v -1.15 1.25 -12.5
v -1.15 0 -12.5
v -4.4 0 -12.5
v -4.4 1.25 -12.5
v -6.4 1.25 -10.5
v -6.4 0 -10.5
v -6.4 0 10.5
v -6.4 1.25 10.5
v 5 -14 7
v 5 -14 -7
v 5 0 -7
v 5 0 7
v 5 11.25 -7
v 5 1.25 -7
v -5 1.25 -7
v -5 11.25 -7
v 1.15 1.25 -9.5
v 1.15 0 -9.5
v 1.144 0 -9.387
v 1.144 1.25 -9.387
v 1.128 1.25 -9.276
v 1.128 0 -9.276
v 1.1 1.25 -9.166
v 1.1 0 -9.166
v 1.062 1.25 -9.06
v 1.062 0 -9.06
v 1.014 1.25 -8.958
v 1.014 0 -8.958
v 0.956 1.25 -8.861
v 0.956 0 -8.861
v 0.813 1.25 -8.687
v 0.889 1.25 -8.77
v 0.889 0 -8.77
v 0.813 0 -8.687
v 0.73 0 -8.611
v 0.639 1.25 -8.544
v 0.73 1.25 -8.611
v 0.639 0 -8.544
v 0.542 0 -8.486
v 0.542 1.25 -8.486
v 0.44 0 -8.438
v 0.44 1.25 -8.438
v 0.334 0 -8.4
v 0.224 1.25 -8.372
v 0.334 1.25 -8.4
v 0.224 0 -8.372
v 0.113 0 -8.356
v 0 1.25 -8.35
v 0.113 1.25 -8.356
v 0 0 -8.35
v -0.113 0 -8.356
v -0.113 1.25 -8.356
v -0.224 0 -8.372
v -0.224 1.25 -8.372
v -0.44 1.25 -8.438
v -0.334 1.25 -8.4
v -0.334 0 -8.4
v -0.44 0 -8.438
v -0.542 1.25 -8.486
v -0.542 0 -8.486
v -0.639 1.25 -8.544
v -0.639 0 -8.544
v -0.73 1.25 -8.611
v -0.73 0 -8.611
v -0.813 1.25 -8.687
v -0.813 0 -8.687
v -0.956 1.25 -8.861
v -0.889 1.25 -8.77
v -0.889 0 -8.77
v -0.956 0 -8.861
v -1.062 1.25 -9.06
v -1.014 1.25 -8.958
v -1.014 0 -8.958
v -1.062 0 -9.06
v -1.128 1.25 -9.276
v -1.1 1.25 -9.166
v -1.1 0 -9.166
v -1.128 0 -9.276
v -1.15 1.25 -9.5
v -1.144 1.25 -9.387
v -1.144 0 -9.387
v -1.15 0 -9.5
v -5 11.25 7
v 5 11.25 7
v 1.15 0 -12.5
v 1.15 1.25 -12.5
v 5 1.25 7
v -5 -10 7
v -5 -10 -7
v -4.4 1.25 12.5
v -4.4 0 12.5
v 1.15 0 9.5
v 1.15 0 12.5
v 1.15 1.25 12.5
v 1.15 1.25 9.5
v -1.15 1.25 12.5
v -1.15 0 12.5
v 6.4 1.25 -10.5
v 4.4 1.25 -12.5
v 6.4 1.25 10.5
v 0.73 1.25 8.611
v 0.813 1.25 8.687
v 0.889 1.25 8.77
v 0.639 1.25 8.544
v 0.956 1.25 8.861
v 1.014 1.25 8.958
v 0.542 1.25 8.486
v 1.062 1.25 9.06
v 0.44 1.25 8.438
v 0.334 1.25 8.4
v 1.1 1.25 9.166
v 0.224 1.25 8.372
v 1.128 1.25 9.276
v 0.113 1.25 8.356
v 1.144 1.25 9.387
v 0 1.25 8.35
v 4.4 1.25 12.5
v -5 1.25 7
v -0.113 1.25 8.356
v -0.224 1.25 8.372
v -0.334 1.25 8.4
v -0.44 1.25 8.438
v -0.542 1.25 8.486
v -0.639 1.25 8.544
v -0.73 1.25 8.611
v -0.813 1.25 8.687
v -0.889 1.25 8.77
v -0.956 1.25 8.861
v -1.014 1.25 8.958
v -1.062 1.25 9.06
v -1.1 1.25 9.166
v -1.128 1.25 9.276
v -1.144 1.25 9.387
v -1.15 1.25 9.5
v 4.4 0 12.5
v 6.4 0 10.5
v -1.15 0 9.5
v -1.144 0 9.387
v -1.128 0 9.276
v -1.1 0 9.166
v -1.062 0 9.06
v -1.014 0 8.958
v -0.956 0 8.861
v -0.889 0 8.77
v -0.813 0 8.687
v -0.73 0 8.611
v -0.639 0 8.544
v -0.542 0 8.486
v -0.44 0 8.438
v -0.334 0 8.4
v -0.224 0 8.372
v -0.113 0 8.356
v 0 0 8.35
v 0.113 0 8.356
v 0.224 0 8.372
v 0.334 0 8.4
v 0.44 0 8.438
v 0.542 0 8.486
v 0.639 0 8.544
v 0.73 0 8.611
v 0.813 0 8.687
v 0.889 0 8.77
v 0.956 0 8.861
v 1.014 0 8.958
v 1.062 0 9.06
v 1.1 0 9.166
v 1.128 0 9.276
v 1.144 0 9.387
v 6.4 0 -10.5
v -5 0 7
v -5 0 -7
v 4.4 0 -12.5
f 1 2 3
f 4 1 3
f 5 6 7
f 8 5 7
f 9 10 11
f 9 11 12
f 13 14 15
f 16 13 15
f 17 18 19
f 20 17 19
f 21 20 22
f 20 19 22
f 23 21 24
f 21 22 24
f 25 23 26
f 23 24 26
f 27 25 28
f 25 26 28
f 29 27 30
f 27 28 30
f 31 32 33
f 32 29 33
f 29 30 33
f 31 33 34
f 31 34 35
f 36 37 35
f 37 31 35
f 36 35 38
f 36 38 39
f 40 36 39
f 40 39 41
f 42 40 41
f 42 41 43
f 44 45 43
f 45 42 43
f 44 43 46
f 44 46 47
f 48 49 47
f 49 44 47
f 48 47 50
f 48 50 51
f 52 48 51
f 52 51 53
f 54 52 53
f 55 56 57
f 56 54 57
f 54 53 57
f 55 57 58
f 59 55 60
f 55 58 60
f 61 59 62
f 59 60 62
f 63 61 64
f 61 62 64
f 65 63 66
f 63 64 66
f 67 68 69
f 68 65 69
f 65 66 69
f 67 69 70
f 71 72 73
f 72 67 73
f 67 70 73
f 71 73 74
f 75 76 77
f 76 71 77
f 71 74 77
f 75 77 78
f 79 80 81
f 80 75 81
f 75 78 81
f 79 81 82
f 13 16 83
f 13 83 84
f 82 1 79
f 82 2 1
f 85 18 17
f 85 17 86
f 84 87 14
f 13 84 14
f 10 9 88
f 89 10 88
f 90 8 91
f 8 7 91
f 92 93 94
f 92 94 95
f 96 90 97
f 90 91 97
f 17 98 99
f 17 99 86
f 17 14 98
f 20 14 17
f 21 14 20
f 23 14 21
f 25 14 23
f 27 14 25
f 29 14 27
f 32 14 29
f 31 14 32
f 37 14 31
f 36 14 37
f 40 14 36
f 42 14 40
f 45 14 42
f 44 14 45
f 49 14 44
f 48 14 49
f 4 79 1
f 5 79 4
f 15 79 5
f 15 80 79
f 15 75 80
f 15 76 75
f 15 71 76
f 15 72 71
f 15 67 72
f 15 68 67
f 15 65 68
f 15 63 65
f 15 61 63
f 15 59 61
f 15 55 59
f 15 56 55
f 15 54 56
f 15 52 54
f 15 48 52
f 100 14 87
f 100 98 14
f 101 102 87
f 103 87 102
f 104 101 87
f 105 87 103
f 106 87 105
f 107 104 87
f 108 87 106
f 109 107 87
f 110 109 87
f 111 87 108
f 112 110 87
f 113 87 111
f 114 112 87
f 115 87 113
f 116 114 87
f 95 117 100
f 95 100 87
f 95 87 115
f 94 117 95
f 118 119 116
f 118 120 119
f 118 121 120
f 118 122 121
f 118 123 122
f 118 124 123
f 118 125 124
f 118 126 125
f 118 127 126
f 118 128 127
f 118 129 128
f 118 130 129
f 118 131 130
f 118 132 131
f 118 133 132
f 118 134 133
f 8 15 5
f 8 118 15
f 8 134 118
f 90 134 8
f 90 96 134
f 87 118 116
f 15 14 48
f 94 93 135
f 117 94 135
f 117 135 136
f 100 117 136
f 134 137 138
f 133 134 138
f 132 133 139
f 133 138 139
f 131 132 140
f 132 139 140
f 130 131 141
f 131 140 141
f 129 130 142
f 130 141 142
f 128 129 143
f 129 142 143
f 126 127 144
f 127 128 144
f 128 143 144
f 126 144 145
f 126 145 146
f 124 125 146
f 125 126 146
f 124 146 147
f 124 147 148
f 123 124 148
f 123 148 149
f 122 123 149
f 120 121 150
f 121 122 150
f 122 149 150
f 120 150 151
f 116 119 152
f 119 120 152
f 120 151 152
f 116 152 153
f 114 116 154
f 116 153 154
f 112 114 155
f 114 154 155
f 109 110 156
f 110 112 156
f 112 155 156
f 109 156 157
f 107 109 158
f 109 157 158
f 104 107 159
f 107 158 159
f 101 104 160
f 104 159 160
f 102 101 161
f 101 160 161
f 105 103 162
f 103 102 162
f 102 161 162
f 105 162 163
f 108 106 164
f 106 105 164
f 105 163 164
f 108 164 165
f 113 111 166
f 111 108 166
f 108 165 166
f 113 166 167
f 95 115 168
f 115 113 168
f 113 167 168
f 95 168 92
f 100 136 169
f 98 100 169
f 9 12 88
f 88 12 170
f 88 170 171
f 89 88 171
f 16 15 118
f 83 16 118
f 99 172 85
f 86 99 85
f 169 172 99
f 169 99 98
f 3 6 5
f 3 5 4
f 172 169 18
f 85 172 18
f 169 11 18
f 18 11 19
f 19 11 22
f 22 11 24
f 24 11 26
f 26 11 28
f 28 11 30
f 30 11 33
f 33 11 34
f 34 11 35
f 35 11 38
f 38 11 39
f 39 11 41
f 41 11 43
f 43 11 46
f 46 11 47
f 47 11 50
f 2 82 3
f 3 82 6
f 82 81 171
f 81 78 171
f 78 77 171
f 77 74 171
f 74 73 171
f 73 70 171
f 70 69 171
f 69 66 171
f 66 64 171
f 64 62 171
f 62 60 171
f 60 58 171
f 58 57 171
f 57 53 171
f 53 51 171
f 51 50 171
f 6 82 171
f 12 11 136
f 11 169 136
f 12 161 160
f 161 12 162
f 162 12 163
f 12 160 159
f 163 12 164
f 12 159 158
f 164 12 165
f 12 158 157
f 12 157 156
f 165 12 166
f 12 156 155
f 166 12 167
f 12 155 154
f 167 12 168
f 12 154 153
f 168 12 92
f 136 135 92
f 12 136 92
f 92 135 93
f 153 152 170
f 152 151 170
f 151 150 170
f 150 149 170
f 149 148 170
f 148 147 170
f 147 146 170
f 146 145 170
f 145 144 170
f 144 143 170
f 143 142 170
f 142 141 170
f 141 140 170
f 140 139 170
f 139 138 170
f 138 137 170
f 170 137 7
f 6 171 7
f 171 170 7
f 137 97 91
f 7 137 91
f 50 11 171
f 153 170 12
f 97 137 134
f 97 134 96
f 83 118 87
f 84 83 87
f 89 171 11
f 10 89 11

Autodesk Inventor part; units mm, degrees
ref_plane "YZ Plane" through (0, 0, 0) normal (1, 0, 0) x (0, 1, 0)
ref_plane "XZ Plane" through (0, 0, 0) normal (0, 1, 0) x (-1, 0, 0)
ref_plane "XY Plane" through (0, 0, 0) normal (0, 0, 1) x (1, 0, 0)
sketch "Sketch1" plane through (0, 0, 0) normal (0, 1, 0) x (-1, 0, 0)
  line L0 (-4.4, -12.5) -> (4.4, -12.5)
  line L1 (6.4, -10.5) -> (6.4, 10.5)
  line L2 (4.4, 12.5) -> (-4.4, 12.5)
  line L3 (-6.4, 10.5) -> (-6.4, -10.5)
  line L4 (-6.4, -12.5) -> (6.4, 12.5) construction
  line L5 (6.4, -12.5) -> (-6.4, 12.5) construction
  line L6 (6.4, 10.5) -> (4.4, 12.5)
  line L7 (-4.4, 12.5) -> (-6.4, 10.5)
  line L8 (6.4, -10.5) -> (4.4, -12.5)
  line L9 (-4.4, -12.5) -> (-6.4, -10.5)
  line L10 (0, 12.5) -> (0, 9.5) construction
  line L11 (-1.15, 12.5) -> (-1.15, 9.5)
  line L12 (1.15, 9.5) -> (1.15, 12.5)
  arc A0 (1.15, 12.5) -> (-1.15, 12.5) centre (0, 12.5) ccw
  arc A1 (-1.15, 9.5) -> (1.15, 9.5) centre (0, 9.5) ccw
  line L13 (0, -12.5) -> (0, -9.5) construction
  line L14 (1.15, -12.5) -> (1.15, -9.5)
  line L15 (-1.15, -9.5) -> (-1.15, -12.5)
  arc A2 (-1.15, -12.5) -> (1.15, -12.5) centre (0, -12.5) ccw
  arc A3 (1.15, -9.5) -> (-1.15, -9.5) centre (0, -9.5) ccw
  point P0 (0, 0)
  point P1 (0, 11)
  point P2 (0, -11)
  dimension "d0" = 25
  dimension "d1" = 12.8
  dimension "d2" = 2
  dimension "d3" = 2
  dimension "d4" = 2
  dimension "d5" = 2
  dimension "d6" = 2
  dimension "d7" = 2
  dimension "d8" = 2
  dimension "d9" = 2
  dimension "d10" = 2.3
  dimension "d11" = 2.3
  dimension "d12" = 3
  dimension "d13" = 3
extrude "Extrusion1" add sketch "Sketch1" along normal blind 1.25 contours L9 L3 L7 L2 L11 A1 L12 L6 L1 L8 L0 L14 A3 L15
sketch "Sketch2" plane through (0, 1.25, 0) normal (0, 1, 0) x (1, 0, 0)
  line L0 (5, 7) -> (-5, 7)
  line L1 (-5, 7) -> (-5, -7)
  line L2 (-5, -7) -> (5, -7)
  line L3 (5, -7) -> (5, 7)
  line L4 (5, 7) -> (-5, -7) construction
  line L5 (-5, 7) -> (5, -7) construction
  point P0 (0, 0)
  dimension "d16" = 10
  dimension "d17" = 14
extrude "Extrusion2" add sketch "Sketch2" along normal blind 10
sketch "Sketch3" plane through (0, 0, 0) normal (0, -1, 0) x (1, 0, 0)
  line L0 (5, 7) -> (-5, 7)
  line L1 (-5, 7) -> (-5, -7)
  line L2 (-5, -7) -> (5, -7)
  line L3 (5, -7) -> (5, 7)
  line L4 (5, 7) -> (-5, -7) construction
  line L5 (-5, 7) -> (5, -7) construction
  point P0 (0, 0)
  dimension "d20" = 10
  dimension "d21" = 14
extrude "Extrusion3" add sketch "Sketch3" along normal blind 14
sketch "Sketch4" plane through (-5, 0, 7) normal (0, 0, 1) x (1, 0, 0)
  line L0 (10, 0) -> (10, -14) projected
  line L1 (10, -14) -> (0, -10)
  line L2 (0, 0) -> (0, -14) projected
  line L3 (10, -14) -> (0, -14) projected
  point P0 (5, 0)
  dimension "d24" = 4
extrude "Extrusion4" cut sketch "Sketch4" against normal through all
equation "\"d3\" = d2"
equation "\"d4\" = d2"
equation "\"d5\" = d4"
equation "\"d6\" = d2"
equation "\"d7\" = d6"
equation "\"d8\" = d2"
equation "\"d9\" = d8"
equation "\"d11\" = d10"
equation "\"d13\" = d12"
properties part number "Molex 1061141150 Fiber-Optic Passthrough"
